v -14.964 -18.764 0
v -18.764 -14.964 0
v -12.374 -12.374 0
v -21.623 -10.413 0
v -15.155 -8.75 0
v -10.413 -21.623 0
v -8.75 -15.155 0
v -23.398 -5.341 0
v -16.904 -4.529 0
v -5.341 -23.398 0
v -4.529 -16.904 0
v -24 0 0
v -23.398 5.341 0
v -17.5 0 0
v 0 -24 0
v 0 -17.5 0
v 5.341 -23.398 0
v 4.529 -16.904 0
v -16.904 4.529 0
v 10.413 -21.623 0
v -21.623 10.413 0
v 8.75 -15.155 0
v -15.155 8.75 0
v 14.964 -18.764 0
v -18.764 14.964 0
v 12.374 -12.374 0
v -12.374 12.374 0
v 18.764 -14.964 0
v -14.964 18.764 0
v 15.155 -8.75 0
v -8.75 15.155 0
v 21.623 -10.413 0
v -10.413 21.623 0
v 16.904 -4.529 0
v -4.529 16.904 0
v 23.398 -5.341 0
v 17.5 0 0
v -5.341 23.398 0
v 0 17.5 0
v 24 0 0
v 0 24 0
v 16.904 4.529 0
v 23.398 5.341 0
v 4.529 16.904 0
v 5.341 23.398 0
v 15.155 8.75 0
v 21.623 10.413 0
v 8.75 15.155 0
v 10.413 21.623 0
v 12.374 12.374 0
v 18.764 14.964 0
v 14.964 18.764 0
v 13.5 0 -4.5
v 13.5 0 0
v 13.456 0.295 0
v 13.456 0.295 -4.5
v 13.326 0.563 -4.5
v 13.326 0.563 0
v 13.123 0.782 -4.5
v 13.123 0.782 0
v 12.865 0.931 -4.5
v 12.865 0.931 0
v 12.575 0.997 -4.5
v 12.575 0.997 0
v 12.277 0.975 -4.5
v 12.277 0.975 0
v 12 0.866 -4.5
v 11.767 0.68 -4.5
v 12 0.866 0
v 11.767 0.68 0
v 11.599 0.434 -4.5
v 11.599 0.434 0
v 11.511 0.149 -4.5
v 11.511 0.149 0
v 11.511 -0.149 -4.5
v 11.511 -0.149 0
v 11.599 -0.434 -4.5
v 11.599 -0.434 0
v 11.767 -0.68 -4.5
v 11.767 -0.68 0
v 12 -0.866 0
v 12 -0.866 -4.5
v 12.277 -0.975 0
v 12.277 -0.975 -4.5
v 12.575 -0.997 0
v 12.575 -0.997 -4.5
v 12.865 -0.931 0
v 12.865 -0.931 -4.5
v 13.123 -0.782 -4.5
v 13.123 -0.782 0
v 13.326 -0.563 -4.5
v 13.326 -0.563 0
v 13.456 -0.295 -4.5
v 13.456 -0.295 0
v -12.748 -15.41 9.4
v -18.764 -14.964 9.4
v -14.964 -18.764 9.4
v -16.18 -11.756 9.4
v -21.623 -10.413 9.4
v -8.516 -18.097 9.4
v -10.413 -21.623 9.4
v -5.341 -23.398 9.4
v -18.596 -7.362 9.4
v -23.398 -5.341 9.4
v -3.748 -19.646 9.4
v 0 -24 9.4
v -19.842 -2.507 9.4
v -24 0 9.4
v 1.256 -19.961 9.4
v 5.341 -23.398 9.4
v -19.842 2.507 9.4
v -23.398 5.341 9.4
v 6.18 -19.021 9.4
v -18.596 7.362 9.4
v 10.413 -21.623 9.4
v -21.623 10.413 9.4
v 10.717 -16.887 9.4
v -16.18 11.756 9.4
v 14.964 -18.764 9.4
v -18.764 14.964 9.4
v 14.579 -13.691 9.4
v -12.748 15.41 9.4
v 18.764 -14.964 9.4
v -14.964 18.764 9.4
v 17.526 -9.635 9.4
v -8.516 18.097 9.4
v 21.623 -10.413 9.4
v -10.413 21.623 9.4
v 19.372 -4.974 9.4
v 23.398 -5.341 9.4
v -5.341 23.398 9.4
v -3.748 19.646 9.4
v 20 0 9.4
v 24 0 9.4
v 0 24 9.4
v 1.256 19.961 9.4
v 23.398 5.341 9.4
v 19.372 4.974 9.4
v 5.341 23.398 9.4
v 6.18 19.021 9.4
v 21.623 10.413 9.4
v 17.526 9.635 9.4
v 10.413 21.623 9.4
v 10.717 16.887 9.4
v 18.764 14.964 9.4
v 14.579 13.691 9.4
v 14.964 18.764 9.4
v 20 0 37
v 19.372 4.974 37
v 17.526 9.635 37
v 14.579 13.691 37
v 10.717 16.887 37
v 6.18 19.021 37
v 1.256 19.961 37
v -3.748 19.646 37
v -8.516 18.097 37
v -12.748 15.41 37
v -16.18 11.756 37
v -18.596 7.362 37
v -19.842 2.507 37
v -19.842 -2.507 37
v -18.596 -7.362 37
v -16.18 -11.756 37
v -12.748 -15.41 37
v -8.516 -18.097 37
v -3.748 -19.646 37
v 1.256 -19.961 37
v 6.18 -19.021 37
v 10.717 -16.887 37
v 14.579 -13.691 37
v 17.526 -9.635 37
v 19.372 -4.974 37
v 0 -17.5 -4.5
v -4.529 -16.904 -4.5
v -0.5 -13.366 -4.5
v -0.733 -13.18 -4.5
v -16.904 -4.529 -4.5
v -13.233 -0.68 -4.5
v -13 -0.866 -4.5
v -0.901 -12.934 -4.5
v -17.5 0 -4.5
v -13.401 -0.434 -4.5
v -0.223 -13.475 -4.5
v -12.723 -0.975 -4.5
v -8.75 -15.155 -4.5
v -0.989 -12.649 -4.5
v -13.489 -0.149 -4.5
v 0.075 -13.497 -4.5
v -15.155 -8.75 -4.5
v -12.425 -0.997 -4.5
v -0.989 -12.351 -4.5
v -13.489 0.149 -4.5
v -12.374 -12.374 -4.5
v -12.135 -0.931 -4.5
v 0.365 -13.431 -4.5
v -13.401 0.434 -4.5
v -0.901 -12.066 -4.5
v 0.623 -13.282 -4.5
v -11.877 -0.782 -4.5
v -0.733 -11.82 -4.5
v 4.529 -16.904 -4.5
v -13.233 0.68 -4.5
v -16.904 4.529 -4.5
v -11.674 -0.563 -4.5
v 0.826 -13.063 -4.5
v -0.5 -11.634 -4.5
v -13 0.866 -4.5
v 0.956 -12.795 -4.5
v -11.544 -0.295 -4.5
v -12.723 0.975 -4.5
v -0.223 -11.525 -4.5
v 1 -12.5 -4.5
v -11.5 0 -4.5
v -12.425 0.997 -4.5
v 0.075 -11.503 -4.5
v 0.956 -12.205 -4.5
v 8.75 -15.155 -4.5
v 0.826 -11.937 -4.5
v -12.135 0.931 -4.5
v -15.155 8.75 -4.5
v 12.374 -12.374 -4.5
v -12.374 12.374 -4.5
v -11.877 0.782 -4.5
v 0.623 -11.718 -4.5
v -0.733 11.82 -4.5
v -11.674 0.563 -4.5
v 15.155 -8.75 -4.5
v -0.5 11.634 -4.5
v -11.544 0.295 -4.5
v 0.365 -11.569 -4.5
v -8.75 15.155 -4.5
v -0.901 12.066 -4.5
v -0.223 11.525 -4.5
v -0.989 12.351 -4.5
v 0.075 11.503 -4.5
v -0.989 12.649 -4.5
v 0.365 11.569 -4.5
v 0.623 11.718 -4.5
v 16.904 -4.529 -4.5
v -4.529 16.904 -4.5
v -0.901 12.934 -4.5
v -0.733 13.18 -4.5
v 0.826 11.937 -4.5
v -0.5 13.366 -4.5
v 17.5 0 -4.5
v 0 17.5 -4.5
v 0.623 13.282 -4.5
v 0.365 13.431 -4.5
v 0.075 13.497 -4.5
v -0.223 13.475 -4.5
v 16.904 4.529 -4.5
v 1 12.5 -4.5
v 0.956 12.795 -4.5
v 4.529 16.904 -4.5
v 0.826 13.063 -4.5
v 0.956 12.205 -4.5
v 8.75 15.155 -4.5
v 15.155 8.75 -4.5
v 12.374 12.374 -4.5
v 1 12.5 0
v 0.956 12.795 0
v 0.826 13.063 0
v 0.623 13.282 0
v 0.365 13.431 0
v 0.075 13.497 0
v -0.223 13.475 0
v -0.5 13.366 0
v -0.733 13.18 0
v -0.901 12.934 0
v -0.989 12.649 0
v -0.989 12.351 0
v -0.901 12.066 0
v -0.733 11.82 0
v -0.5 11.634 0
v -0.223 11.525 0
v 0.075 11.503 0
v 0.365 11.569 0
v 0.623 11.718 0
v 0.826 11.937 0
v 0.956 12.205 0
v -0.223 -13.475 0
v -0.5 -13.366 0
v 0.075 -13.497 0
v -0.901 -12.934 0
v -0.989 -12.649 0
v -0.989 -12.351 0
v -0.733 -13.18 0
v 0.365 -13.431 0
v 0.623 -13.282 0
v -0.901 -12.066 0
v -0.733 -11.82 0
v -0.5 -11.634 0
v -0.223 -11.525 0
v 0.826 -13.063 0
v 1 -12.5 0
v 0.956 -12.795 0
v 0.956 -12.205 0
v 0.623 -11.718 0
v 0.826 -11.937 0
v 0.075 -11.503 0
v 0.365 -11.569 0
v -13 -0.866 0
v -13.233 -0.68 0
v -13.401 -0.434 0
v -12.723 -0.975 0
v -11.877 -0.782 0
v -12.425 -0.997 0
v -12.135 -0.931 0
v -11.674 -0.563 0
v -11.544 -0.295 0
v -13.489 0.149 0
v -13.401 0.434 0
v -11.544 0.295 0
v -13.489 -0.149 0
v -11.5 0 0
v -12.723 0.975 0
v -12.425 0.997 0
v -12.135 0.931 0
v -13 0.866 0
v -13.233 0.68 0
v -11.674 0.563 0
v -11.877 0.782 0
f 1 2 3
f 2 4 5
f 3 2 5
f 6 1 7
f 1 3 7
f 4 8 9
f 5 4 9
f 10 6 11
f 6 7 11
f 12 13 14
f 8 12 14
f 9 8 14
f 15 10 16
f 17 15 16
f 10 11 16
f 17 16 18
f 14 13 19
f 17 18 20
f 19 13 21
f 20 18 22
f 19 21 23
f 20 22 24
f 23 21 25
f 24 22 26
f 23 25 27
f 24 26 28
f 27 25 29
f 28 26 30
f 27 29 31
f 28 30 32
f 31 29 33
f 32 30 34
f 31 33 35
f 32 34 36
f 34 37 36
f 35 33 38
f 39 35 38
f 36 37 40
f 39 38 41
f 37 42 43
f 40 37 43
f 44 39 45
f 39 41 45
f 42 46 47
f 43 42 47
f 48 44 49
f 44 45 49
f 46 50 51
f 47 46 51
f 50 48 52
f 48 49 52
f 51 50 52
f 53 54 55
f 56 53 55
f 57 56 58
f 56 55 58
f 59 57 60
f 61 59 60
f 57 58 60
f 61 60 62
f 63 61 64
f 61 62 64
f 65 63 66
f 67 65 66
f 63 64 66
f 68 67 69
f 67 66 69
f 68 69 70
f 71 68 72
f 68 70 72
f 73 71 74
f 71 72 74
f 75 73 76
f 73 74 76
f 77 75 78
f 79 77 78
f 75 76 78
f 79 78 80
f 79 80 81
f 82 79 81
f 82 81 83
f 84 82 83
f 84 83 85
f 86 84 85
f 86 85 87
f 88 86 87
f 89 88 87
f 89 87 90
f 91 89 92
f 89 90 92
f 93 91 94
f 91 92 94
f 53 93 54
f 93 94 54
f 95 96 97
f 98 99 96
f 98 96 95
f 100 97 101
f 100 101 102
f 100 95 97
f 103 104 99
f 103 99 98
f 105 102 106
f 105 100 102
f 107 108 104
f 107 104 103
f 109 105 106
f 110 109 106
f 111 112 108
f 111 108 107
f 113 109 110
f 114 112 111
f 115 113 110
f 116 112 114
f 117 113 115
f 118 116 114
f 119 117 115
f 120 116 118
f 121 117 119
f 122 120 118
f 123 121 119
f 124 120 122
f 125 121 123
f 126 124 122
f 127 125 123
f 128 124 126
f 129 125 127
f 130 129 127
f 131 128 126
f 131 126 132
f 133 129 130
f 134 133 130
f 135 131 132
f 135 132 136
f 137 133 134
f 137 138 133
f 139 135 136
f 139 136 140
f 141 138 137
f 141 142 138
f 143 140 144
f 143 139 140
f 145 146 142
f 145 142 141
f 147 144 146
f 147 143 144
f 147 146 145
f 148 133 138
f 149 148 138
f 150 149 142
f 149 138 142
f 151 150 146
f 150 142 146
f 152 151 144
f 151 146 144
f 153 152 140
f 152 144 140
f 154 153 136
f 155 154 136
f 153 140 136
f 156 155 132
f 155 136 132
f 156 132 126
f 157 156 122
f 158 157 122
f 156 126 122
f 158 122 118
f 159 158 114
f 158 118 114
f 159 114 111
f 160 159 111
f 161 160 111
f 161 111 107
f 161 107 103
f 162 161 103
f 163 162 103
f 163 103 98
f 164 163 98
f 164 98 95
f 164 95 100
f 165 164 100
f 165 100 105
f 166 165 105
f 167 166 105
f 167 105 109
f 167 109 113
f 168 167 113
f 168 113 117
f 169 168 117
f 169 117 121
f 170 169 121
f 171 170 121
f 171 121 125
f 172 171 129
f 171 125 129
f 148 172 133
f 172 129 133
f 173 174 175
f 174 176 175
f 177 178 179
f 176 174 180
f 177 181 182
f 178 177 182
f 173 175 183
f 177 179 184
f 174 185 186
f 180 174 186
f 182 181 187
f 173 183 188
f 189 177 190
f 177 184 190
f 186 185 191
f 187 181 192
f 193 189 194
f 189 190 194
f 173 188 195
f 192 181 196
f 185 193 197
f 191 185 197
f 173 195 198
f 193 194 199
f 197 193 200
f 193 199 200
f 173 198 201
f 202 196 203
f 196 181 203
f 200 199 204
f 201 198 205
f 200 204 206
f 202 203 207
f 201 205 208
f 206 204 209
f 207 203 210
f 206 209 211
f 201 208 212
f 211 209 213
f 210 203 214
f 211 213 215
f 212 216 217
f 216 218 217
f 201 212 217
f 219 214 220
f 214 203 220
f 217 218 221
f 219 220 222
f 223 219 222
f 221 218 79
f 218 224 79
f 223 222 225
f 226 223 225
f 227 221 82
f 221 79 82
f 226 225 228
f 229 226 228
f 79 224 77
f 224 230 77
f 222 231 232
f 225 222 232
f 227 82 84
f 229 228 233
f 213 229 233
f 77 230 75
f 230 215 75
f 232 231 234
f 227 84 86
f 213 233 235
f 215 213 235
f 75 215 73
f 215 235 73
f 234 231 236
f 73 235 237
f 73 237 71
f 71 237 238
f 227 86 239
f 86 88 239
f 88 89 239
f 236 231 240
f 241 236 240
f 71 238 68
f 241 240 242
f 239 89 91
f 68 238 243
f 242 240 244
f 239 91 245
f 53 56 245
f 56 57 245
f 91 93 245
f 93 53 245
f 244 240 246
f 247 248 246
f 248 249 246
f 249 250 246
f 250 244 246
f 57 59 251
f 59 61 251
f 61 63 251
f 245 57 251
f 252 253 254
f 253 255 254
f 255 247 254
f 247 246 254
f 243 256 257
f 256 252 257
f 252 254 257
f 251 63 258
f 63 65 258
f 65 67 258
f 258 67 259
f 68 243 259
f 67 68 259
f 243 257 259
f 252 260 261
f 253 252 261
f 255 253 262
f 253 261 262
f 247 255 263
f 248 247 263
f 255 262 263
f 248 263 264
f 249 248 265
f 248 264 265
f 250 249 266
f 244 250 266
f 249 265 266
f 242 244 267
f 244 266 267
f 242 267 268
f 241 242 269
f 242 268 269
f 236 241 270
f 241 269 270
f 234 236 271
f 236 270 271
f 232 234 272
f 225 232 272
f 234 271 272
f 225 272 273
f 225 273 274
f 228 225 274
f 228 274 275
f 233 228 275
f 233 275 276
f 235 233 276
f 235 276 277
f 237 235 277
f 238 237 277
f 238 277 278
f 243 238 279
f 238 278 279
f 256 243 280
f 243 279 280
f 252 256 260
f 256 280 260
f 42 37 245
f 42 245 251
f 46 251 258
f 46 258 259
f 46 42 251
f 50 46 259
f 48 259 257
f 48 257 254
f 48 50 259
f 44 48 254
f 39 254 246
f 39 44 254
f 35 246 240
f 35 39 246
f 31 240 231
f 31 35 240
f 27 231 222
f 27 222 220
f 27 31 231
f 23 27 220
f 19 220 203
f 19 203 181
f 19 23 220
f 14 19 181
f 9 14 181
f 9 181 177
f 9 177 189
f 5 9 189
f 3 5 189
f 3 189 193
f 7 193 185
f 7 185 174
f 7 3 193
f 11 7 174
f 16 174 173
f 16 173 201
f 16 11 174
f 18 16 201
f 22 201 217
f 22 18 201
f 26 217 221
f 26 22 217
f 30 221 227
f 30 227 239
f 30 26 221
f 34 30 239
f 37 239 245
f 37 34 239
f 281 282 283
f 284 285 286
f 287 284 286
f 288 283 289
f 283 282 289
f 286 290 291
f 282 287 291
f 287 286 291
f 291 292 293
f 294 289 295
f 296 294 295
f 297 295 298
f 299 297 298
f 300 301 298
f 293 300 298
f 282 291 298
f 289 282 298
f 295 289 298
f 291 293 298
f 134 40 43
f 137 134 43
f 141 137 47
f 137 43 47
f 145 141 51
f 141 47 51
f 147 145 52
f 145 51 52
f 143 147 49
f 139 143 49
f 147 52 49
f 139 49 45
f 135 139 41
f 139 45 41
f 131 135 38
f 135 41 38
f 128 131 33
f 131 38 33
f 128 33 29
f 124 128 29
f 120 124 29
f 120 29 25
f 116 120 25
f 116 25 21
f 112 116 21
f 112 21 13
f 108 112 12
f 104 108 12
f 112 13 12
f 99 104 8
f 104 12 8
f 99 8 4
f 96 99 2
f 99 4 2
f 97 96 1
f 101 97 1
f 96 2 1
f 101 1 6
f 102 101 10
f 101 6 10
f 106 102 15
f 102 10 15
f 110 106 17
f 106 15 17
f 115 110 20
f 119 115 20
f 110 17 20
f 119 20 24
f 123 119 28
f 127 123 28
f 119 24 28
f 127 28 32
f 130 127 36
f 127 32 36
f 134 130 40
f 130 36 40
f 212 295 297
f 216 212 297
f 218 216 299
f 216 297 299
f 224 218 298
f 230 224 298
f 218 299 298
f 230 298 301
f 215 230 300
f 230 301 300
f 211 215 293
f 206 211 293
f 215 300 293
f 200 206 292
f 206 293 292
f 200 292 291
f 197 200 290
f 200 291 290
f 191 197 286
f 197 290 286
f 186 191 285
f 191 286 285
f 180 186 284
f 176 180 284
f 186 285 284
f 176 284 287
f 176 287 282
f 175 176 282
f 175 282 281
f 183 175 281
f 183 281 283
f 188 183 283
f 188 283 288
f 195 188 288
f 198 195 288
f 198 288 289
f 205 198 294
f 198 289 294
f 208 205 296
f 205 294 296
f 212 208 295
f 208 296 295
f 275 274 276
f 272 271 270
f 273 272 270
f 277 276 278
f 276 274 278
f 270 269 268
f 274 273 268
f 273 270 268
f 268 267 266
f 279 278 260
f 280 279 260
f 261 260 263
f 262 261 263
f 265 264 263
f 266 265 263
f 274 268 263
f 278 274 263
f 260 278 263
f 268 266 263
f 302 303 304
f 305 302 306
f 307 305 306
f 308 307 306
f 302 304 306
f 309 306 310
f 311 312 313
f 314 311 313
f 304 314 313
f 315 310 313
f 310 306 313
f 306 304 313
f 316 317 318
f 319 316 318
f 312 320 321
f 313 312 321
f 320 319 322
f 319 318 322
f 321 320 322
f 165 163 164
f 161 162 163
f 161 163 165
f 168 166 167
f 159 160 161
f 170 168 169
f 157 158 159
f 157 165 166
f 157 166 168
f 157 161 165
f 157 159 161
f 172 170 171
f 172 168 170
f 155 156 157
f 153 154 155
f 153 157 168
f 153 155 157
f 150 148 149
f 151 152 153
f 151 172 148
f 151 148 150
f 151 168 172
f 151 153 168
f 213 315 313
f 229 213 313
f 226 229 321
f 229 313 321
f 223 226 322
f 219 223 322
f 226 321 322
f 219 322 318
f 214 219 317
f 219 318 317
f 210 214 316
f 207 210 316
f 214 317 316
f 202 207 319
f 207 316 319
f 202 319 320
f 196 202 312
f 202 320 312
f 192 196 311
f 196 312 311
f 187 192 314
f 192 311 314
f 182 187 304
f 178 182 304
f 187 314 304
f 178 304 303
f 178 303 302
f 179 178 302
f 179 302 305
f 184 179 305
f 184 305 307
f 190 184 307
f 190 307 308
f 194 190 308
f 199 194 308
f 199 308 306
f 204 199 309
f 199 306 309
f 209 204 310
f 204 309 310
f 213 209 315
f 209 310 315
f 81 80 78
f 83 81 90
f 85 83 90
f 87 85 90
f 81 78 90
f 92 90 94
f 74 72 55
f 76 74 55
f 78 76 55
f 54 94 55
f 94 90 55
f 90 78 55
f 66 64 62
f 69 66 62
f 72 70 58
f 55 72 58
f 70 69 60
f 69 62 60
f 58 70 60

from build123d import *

# Parameters (mm, degrees)
SKETCH1_R           = 24
SKETCH1_R_2         = 1
BOSS_EXTRUDE1_DEPTH = 9.4
SKETCH1_4_R         = 20
BOSS_EXTRUDE2_DEPTH = 37
SKETCH1_5_R         = 17.5
SKETCH1_5_R_2       = 1
BOSS_EXTRUDE3_DEPTH = 4.5


with BuildPart() as part:
    # Sketch1 → Boss-Extrude1 (new body)
    with BuildSketch(Plane.XY):
        Circle(SKETCH1_R)
        with Locations((0, 12.5)):
            Circle(SKETCH1_R_2, mode=Mode.SUBTRACT)
        with Locations((0, -12.5)):
            Circle(SKETCH1_R_2, mode=Mode.SUBTRACT)
        with Locations((12.5, 0)):
            Circle(SKETCH1_R_2, mode=Mode.SUBTRACT)
        with Locations((-12.5, 0)):
            Circle(SKETCH1_R_2, mode=Mode.SUBTRACT)
    extrude(amount=BOSS_EXTRUDE1_DEPTH)

    # Sketch1<4> → Boss-Extrude2 (add)
    with BuildSketch(Plane.XY):
        Circle(SKETCH1_4_R)
    extrude(amount=BOSS_EXTRUDE2_DEPTH)

    # Sketch1<5> → Boss-Extrude3 (add)
    with BuildSketch(Plane.XY):
        Circle(SKETCH1_5_R)
        with Locations((0, -12.5)):
            Circle(SKETCH1_5_R_2, mode=Mode.SUBTRACT)
        with Locations((12.5, 0)):
            Circle(SKETCH1_5_R_2, mode=Mode.SUBTRACT)
        with Locations((-12.5, 0)):
            Circle(SKETCH1_5_R_2, mode=Mode.SUBTRACT)
        with Locations((0, 12.5)):
            Circle(SKETCH1_5_R_2, mode=Mode.SUBTRACT)
    extrude(amount=-BOSS_EXTRUDE3_DEPTH)


solid = part.part
